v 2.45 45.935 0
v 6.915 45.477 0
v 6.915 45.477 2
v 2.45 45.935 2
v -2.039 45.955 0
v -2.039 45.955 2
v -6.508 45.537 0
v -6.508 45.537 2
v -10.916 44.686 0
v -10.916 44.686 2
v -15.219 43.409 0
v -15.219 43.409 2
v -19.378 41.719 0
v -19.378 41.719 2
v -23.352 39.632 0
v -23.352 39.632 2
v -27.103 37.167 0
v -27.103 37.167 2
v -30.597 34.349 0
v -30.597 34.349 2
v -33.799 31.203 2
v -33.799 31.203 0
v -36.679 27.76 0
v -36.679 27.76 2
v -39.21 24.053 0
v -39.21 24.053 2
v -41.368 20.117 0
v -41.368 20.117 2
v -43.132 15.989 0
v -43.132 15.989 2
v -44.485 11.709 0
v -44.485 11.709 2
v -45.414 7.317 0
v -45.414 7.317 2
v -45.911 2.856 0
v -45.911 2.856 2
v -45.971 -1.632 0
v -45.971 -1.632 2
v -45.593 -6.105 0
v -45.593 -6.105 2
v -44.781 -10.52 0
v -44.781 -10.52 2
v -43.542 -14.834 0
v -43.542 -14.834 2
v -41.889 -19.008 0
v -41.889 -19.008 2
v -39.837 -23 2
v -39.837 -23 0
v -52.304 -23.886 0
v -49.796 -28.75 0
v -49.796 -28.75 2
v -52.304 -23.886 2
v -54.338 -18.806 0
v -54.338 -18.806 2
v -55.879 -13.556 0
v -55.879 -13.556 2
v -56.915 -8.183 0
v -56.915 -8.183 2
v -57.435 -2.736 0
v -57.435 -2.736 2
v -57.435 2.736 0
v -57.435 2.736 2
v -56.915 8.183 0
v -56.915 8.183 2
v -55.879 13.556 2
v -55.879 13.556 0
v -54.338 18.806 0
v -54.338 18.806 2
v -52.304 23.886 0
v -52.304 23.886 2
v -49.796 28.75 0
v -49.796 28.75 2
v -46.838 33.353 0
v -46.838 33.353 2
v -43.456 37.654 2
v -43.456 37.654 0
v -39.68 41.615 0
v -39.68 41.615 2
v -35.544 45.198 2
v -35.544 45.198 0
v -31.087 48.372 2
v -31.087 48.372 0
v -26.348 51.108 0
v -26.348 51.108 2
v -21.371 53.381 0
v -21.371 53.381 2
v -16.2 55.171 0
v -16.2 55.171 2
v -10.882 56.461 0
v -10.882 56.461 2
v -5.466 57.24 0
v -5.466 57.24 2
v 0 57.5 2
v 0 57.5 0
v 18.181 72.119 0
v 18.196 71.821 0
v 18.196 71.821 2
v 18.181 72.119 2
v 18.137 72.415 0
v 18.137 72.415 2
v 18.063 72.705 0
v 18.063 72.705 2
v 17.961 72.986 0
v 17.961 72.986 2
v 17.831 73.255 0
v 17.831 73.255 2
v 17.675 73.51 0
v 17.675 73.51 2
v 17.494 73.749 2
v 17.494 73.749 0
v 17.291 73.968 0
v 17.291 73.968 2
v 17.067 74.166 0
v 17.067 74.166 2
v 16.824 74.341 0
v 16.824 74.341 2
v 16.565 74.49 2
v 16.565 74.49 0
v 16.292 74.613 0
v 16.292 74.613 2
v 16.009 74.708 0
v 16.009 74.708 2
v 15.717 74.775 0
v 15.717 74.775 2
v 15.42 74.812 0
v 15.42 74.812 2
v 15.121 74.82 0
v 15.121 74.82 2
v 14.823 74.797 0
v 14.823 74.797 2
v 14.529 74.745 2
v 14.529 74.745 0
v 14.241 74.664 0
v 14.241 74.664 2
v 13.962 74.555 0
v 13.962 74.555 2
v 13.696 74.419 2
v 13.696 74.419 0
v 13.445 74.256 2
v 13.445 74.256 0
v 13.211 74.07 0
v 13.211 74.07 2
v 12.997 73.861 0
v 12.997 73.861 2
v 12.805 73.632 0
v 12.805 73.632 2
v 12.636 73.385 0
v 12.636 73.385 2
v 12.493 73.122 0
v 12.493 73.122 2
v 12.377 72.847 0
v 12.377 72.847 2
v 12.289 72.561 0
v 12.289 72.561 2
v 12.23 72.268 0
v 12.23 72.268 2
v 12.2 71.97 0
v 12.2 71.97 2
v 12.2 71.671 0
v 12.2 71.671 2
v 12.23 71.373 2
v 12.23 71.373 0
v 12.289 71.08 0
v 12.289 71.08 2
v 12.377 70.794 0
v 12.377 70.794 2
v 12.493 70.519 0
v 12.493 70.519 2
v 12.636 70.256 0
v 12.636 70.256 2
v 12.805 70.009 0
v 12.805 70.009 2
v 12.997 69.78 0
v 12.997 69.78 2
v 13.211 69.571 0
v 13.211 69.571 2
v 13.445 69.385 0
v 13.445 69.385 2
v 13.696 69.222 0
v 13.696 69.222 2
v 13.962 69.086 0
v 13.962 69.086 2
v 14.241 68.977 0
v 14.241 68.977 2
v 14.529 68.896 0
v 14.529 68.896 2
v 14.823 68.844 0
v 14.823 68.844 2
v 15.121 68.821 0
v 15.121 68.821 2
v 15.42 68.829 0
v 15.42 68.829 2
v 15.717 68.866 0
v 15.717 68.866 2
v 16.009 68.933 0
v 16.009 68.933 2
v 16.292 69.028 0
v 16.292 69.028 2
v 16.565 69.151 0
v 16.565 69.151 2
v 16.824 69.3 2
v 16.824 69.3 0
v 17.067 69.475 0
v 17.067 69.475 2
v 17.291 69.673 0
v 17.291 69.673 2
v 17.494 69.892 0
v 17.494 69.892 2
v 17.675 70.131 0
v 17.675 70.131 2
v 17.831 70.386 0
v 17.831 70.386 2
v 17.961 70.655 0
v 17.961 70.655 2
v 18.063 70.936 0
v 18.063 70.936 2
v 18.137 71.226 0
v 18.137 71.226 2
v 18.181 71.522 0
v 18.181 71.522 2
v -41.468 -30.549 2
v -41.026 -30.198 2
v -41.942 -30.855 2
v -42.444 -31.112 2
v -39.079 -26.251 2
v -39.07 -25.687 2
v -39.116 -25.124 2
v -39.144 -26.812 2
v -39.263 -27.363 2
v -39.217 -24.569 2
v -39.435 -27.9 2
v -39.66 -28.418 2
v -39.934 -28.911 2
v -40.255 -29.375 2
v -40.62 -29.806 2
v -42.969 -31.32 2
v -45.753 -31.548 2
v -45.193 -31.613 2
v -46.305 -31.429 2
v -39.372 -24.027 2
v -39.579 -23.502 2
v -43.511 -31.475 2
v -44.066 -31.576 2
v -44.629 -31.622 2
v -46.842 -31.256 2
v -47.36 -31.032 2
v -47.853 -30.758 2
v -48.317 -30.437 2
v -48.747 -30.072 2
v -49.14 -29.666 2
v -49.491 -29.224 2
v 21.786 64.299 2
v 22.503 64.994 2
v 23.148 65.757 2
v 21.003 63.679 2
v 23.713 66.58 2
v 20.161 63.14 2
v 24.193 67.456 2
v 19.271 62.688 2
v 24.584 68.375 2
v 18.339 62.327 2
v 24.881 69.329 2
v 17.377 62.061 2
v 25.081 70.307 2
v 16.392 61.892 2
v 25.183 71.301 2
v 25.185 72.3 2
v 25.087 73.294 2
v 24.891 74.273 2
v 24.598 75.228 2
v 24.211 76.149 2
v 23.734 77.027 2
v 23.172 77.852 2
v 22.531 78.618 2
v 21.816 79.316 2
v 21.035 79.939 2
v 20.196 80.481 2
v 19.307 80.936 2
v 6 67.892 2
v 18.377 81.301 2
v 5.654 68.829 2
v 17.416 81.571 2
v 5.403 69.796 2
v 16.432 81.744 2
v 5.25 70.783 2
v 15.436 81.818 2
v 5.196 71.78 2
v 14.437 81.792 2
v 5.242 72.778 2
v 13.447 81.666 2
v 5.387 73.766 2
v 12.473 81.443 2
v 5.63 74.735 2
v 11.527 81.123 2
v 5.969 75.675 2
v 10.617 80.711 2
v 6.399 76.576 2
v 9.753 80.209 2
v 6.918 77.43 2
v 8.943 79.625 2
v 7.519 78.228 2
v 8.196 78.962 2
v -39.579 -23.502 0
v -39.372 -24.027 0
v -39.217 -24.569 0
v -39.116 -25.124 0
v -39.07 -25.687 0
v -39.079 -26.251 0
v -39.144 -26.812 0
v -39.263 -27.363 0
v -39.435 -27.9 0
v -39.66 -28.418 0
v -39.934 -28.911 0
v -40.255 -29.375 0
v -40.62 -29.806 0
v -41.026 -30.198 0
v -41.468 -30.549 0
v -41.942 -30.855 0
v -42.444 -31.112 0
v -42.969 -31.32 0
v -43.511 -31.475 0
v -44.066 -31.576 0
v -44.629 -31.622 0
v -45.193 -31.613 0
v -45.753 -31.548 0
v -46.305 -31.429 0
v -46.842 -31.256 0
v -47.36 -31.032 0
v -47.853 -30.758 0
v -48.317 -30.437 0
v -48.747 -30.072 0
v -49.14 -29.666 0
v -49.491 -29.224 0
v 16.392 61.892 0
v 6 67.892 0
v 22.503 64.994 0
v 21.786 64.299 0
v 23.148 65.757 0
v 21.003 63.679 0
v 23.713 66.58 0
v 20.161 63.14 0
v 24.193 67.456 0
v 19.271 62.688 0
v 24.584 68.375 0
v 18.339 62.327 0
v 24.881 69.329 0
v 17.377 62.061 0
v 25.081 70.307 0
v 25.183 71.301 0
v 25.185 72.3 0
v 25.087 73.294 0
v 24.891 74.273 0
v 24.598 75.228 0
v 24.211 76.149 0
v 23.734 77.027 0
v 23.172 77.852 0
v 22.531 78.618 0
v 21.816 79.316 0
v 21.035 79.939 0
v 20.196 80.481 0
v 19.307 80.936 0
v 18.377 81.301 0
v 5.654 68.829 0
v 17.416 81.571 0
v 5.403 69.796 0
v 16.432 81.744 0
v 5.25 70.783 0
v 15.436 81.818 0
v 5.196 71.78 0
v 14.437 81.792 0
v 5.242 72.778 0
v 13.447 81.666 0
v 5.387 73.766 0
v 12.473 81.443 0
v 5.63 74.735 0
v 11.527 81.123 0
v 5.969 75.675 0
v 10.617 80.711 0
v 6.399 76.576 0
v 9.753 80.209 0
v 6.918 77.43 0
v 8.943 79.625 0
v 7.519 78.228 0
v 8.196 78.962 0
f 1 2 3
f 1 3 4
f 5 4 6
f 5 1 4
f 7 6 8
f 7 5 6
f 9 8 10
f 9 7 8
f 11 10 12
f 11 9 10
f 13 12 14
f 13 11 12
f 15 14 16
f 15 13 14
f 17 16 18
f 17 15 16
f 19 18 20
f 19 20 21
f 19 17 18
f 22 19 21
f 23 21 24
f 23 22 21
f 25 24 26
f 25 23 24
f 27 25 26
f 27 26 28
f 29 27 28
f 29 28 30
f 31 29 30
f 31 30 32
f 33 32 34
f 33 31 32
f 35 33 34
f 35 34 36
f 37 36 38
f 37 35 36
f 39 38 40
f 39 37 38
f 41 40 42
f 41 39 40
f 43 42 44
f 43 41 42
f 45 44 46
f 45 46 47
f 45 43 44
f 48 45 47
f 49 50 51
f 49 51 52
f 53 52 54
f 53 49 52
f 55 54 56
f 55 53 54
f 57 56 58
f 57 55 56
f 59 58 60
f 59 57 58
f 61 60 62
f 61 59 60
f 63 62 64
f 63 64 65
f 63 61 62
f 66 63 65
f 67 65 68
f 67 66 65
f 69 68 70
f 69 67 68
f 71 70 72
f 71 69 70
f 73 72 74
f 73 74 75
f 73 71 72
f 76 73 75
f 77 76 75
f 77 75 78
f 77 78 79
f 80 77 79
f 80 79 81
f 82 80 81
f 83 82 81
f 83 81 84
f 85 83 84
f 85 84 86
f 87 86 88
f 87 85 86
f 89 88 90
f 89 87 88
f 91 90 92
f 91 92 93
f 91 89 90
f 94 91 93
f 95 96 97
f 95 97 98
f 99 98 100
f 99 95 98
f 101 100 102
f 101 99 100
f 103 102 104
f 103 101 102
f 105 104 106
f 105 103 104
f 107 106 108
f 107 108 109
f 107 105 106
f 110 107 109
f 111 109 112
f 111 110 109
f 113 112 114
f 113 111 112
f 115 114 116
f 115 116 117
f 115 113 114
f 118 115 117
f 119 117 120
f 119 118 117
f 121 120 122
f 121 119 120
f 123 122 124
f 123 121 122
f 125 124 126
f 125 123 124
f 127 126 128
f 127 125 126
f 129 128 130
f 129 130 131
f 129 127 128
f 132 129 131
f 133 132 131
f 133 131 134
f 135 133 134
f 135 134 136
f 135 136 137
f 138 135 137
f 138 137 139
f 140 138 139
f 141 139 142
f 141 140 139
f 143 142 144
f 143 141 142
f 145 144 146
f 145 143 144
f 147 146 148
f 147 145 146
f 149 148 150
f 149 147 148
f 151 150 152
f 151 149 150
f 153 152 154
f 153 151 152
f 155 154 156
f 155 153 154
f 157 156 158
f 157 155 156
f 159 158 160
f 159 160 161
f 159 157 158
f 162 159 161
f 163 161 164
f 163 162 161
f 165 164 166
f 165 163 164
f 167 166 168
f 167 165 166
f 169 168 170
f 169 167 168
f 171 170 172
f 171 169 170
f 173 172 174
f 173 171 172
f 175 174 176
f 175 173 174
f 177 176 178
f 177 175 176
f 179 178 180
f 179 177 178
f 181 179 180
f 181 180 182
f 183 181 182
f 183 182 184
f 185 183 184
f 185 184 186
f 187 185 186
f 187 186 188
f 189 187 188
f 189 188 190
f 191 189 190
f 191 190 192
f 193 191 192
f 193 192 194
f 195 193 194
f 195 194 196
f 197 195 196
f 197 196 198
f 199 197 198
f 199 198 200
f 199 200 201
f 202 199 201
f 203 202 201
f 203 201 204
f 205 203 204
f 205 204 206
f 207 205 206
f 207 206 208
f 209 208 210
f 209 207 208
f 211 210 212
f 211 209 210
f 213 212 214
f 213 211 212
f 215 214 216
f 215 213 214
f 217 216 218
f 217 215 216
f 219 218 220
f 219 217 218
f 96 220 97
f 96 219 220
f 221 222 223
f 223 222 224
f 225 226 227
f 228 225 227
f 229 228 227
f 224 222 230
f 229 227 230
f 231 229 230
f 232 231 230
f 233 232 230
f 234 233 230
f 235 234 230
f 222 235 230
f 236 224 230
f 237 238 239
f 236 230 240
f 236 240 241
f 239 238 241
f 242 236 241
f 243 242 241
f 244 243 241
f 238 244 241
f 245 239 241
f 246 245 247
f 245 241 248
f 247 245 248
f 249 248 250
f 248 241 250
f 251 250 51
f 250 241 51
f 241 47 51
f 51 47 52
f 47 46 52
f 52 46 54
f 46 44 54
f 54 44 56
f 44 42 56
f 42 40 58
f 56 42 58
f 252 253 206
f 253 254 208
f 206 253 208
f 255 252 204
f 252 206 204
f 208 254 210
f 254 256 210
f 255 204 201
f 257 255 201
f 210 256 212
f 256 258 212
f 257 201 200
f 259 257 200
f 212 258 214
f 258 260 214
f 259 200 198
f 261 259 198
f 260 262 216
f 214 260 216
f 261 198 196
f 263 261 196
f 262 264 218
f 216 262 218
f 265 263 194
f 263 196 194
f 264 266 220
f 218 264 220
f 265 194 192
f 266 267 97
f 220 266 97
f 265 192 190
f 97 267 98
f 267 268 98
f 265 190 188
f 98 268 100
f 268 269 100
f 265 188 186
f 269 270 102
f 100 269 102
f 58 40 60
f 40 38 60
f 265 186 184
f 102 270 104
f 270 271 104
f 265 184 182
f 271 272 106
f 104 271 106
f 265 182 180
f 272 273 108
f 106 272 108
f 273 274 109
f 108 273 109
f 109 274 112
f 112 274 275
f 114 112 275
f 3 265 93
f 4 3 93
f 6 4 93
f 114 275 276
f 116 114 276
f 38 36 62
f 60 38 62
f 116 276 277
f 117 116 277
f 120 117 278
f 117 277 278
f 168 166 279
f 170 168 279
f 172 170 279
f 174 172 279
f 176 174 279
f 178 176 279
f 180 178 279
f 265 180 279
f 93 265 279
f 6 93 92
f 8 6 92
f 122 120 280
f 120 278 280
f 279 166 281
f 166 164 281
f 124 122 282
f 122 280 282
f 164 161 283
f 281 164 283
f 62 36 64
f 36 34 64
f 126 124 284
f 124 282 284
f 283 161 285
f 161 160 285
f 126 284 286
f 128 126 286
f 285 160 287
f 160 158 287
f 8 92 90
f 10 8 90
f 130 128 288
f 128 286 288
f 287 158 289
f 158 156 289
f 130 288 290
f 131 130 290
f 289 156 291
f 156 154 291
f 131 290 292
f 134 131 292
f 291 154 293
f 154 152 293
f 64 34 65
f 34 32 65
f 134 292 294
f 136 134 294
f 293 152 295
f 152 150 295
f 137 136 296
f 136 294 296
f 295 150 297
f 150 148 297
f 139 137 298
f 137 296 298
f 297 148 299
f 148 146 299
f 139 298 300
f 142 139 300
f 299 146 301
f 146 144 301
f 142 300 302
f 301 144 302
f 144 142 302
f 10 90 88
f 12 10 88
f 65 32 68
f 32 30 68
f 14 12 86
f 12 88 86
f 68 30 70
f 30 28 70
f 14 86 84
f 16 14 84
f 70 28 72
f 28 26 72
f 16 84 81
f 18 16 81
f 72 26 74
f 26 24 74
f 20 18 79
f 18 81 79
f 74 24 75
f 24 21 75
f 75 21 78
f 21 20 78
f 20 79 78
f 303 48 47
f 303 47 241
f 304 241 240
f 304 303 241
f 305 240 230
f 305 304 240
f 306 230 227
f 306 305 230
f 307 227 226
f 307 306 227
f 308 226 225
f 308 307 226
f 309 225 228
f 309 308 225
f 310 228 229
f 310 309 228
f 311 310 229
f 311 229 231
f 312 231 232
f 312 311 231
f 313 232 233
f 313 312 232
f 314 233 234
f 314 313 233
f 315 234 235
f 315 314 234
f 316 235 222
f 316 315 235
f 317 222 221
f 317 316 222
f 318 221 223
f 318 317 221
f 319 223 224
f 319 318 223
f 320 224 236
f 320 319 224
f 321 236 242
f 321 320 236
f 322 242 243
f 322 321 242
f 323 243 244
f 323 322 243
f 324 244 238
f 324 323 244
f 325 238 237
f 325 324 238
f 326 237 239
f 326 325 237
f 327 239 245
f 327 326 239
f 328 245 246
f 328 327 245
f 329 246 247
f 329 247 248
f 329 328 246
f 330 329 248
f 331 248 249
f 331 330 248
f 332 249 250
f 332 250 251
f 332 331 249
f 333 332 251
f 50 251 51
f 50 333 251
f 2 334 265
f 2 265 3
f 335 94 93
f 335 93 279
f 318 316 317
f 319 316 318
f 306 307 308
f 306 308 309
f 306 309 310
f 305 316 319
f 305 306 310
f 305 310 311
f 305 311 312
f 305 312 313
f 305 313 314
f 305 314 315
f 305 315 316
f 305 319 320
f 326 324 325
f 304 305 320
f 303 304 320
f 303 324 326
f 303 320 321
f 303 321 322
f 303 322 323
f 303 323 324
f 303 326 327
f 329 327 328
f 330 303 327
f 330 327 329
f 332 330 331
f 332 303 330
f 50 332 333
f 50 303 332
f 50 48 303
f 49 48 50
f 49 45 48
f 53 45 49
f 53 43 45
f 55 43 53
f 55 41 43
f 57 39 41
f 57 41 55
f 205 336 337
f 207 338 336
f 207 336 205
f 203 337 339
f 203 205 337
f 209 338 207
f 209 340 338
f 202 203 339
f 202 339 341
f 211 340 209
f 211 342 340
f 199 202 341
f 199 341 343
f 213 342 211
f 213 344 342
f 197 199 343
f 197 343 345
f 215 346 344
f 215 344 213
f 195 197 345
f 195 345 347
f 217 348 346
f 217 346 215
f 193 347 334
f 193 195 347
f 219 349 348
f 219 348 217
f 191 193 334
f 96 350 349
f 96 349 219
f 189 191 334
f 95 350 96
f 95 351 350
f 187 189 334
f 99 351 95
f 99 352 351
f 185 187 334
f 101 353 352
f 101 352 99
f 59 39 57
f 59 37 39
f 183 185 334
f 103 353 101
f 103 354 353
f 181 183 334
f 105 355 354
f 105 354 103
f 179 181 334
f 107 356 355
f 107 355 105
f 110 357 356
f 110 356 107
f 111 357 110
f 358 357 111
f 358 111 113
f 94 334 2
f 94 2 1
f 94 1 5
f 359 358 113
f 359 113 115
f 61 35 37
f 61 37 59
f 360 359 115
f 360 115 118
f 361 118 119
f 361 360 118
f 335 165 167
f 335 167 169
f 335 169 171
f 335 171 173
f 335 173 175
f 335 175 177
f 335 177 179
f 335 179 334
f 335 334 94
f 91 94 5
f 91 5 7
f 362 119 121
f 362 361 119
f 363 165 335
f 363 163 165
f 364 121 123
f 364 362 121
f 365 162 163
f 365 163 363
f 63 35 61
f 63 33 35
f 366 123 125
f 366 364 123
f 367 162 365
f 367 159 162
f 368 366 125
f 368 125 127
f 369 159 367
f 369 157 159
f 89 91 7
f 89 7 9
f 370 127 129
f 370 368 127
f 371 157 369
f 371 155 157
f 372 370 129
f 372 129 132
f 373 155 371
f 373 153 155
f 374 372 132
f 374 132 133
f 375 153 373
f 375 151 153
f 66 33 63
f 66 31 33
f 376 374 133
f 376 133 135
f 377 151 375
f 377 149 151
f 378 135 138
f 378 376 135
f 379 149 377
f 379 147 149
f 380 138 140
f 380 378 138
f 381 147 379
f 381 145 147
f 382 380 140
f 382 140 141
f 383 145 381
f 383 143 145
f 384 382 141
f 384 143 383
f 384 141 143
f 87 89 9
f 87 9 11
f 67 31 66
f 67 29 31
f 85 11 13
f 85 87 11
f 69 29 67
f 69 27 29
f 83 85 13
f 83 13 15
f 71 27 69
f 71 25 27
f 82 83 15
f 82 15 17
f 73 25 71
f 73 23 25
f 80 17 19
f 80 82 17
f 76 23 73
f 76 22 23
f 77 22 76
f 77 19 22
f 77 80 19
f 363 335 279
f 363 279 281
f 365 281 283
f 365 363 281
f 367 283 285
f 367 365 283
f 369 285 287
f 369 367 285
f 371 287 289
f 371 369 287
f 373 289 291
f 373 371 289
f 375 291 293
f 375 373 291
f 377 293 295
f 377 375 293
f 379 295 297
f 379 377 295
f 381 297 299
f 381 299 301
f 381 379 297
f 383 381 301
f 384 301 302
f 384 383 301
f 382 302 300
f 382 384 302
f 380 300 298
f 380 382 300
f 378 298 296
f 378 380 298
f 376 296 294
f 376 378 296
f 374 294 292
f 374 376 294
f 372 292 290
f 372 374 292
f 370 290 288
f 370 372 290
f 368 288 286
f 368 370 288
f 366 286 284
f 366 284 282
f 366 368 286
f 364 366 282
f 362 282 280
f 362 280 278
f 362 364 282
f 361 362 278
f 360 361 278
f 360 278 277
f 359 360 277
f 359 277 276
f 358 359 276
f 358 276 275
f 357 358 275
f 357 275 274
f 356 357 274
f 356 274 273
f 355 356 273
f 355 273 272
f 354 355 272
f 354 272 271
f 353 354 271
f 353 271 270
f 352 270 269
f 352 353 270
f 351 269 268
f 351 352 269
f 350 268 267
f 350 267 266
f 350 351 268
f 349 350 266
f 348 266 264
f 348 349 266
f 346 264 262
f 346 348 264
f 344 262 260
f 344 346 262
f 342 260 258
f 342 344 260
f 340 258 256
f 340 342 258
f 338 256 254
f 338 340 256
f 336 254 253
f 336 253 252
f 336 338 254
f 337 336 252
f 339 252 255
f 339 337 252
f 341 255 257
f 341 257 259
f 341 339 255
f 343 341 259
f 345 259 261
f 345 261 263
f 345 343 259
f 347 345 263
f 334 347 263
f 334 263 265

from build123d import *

# Parameters (mm, degrees)
SKETCH_1_R      = 3
EXTRUDE_1_DEPTH = 2


with BuildPart() as part:
    # 草图1 → 凸台-拉伸1 (new body)
    with BuildSketch(Plane.XY):
        with BuildLine():
            Line((0, 57.5), (6, 67.892304845))
            ThreePointArc((6, 67.892304845), (20.196152423, 80.480762114), (16.392304845, 61.892304845))
            Line((16.392304845, 61.892304845), (6.915077614, 45.477265766))
            ThreePointArc((6.915077614, 45.477265766), (-37.990130297, 25.937424699), (-39.837168574, -23))
            ThreePointArc((-39.837168574, -23), (-41.941814646, -30.854646072), (-49.796460718, -28.75))
            ThreePointArc((-49.796460718, -28.75), (-49.796460718, 28.75), (0, 57.5))
        make_face()
        with Locations((15.196152423, 71.820508076)):
            Circle(SKETCH_1_R, mode=Mode.SUBTRACT)
    extrude(amount=EXTRUDE_1_DEPTH)


solid = part.part
